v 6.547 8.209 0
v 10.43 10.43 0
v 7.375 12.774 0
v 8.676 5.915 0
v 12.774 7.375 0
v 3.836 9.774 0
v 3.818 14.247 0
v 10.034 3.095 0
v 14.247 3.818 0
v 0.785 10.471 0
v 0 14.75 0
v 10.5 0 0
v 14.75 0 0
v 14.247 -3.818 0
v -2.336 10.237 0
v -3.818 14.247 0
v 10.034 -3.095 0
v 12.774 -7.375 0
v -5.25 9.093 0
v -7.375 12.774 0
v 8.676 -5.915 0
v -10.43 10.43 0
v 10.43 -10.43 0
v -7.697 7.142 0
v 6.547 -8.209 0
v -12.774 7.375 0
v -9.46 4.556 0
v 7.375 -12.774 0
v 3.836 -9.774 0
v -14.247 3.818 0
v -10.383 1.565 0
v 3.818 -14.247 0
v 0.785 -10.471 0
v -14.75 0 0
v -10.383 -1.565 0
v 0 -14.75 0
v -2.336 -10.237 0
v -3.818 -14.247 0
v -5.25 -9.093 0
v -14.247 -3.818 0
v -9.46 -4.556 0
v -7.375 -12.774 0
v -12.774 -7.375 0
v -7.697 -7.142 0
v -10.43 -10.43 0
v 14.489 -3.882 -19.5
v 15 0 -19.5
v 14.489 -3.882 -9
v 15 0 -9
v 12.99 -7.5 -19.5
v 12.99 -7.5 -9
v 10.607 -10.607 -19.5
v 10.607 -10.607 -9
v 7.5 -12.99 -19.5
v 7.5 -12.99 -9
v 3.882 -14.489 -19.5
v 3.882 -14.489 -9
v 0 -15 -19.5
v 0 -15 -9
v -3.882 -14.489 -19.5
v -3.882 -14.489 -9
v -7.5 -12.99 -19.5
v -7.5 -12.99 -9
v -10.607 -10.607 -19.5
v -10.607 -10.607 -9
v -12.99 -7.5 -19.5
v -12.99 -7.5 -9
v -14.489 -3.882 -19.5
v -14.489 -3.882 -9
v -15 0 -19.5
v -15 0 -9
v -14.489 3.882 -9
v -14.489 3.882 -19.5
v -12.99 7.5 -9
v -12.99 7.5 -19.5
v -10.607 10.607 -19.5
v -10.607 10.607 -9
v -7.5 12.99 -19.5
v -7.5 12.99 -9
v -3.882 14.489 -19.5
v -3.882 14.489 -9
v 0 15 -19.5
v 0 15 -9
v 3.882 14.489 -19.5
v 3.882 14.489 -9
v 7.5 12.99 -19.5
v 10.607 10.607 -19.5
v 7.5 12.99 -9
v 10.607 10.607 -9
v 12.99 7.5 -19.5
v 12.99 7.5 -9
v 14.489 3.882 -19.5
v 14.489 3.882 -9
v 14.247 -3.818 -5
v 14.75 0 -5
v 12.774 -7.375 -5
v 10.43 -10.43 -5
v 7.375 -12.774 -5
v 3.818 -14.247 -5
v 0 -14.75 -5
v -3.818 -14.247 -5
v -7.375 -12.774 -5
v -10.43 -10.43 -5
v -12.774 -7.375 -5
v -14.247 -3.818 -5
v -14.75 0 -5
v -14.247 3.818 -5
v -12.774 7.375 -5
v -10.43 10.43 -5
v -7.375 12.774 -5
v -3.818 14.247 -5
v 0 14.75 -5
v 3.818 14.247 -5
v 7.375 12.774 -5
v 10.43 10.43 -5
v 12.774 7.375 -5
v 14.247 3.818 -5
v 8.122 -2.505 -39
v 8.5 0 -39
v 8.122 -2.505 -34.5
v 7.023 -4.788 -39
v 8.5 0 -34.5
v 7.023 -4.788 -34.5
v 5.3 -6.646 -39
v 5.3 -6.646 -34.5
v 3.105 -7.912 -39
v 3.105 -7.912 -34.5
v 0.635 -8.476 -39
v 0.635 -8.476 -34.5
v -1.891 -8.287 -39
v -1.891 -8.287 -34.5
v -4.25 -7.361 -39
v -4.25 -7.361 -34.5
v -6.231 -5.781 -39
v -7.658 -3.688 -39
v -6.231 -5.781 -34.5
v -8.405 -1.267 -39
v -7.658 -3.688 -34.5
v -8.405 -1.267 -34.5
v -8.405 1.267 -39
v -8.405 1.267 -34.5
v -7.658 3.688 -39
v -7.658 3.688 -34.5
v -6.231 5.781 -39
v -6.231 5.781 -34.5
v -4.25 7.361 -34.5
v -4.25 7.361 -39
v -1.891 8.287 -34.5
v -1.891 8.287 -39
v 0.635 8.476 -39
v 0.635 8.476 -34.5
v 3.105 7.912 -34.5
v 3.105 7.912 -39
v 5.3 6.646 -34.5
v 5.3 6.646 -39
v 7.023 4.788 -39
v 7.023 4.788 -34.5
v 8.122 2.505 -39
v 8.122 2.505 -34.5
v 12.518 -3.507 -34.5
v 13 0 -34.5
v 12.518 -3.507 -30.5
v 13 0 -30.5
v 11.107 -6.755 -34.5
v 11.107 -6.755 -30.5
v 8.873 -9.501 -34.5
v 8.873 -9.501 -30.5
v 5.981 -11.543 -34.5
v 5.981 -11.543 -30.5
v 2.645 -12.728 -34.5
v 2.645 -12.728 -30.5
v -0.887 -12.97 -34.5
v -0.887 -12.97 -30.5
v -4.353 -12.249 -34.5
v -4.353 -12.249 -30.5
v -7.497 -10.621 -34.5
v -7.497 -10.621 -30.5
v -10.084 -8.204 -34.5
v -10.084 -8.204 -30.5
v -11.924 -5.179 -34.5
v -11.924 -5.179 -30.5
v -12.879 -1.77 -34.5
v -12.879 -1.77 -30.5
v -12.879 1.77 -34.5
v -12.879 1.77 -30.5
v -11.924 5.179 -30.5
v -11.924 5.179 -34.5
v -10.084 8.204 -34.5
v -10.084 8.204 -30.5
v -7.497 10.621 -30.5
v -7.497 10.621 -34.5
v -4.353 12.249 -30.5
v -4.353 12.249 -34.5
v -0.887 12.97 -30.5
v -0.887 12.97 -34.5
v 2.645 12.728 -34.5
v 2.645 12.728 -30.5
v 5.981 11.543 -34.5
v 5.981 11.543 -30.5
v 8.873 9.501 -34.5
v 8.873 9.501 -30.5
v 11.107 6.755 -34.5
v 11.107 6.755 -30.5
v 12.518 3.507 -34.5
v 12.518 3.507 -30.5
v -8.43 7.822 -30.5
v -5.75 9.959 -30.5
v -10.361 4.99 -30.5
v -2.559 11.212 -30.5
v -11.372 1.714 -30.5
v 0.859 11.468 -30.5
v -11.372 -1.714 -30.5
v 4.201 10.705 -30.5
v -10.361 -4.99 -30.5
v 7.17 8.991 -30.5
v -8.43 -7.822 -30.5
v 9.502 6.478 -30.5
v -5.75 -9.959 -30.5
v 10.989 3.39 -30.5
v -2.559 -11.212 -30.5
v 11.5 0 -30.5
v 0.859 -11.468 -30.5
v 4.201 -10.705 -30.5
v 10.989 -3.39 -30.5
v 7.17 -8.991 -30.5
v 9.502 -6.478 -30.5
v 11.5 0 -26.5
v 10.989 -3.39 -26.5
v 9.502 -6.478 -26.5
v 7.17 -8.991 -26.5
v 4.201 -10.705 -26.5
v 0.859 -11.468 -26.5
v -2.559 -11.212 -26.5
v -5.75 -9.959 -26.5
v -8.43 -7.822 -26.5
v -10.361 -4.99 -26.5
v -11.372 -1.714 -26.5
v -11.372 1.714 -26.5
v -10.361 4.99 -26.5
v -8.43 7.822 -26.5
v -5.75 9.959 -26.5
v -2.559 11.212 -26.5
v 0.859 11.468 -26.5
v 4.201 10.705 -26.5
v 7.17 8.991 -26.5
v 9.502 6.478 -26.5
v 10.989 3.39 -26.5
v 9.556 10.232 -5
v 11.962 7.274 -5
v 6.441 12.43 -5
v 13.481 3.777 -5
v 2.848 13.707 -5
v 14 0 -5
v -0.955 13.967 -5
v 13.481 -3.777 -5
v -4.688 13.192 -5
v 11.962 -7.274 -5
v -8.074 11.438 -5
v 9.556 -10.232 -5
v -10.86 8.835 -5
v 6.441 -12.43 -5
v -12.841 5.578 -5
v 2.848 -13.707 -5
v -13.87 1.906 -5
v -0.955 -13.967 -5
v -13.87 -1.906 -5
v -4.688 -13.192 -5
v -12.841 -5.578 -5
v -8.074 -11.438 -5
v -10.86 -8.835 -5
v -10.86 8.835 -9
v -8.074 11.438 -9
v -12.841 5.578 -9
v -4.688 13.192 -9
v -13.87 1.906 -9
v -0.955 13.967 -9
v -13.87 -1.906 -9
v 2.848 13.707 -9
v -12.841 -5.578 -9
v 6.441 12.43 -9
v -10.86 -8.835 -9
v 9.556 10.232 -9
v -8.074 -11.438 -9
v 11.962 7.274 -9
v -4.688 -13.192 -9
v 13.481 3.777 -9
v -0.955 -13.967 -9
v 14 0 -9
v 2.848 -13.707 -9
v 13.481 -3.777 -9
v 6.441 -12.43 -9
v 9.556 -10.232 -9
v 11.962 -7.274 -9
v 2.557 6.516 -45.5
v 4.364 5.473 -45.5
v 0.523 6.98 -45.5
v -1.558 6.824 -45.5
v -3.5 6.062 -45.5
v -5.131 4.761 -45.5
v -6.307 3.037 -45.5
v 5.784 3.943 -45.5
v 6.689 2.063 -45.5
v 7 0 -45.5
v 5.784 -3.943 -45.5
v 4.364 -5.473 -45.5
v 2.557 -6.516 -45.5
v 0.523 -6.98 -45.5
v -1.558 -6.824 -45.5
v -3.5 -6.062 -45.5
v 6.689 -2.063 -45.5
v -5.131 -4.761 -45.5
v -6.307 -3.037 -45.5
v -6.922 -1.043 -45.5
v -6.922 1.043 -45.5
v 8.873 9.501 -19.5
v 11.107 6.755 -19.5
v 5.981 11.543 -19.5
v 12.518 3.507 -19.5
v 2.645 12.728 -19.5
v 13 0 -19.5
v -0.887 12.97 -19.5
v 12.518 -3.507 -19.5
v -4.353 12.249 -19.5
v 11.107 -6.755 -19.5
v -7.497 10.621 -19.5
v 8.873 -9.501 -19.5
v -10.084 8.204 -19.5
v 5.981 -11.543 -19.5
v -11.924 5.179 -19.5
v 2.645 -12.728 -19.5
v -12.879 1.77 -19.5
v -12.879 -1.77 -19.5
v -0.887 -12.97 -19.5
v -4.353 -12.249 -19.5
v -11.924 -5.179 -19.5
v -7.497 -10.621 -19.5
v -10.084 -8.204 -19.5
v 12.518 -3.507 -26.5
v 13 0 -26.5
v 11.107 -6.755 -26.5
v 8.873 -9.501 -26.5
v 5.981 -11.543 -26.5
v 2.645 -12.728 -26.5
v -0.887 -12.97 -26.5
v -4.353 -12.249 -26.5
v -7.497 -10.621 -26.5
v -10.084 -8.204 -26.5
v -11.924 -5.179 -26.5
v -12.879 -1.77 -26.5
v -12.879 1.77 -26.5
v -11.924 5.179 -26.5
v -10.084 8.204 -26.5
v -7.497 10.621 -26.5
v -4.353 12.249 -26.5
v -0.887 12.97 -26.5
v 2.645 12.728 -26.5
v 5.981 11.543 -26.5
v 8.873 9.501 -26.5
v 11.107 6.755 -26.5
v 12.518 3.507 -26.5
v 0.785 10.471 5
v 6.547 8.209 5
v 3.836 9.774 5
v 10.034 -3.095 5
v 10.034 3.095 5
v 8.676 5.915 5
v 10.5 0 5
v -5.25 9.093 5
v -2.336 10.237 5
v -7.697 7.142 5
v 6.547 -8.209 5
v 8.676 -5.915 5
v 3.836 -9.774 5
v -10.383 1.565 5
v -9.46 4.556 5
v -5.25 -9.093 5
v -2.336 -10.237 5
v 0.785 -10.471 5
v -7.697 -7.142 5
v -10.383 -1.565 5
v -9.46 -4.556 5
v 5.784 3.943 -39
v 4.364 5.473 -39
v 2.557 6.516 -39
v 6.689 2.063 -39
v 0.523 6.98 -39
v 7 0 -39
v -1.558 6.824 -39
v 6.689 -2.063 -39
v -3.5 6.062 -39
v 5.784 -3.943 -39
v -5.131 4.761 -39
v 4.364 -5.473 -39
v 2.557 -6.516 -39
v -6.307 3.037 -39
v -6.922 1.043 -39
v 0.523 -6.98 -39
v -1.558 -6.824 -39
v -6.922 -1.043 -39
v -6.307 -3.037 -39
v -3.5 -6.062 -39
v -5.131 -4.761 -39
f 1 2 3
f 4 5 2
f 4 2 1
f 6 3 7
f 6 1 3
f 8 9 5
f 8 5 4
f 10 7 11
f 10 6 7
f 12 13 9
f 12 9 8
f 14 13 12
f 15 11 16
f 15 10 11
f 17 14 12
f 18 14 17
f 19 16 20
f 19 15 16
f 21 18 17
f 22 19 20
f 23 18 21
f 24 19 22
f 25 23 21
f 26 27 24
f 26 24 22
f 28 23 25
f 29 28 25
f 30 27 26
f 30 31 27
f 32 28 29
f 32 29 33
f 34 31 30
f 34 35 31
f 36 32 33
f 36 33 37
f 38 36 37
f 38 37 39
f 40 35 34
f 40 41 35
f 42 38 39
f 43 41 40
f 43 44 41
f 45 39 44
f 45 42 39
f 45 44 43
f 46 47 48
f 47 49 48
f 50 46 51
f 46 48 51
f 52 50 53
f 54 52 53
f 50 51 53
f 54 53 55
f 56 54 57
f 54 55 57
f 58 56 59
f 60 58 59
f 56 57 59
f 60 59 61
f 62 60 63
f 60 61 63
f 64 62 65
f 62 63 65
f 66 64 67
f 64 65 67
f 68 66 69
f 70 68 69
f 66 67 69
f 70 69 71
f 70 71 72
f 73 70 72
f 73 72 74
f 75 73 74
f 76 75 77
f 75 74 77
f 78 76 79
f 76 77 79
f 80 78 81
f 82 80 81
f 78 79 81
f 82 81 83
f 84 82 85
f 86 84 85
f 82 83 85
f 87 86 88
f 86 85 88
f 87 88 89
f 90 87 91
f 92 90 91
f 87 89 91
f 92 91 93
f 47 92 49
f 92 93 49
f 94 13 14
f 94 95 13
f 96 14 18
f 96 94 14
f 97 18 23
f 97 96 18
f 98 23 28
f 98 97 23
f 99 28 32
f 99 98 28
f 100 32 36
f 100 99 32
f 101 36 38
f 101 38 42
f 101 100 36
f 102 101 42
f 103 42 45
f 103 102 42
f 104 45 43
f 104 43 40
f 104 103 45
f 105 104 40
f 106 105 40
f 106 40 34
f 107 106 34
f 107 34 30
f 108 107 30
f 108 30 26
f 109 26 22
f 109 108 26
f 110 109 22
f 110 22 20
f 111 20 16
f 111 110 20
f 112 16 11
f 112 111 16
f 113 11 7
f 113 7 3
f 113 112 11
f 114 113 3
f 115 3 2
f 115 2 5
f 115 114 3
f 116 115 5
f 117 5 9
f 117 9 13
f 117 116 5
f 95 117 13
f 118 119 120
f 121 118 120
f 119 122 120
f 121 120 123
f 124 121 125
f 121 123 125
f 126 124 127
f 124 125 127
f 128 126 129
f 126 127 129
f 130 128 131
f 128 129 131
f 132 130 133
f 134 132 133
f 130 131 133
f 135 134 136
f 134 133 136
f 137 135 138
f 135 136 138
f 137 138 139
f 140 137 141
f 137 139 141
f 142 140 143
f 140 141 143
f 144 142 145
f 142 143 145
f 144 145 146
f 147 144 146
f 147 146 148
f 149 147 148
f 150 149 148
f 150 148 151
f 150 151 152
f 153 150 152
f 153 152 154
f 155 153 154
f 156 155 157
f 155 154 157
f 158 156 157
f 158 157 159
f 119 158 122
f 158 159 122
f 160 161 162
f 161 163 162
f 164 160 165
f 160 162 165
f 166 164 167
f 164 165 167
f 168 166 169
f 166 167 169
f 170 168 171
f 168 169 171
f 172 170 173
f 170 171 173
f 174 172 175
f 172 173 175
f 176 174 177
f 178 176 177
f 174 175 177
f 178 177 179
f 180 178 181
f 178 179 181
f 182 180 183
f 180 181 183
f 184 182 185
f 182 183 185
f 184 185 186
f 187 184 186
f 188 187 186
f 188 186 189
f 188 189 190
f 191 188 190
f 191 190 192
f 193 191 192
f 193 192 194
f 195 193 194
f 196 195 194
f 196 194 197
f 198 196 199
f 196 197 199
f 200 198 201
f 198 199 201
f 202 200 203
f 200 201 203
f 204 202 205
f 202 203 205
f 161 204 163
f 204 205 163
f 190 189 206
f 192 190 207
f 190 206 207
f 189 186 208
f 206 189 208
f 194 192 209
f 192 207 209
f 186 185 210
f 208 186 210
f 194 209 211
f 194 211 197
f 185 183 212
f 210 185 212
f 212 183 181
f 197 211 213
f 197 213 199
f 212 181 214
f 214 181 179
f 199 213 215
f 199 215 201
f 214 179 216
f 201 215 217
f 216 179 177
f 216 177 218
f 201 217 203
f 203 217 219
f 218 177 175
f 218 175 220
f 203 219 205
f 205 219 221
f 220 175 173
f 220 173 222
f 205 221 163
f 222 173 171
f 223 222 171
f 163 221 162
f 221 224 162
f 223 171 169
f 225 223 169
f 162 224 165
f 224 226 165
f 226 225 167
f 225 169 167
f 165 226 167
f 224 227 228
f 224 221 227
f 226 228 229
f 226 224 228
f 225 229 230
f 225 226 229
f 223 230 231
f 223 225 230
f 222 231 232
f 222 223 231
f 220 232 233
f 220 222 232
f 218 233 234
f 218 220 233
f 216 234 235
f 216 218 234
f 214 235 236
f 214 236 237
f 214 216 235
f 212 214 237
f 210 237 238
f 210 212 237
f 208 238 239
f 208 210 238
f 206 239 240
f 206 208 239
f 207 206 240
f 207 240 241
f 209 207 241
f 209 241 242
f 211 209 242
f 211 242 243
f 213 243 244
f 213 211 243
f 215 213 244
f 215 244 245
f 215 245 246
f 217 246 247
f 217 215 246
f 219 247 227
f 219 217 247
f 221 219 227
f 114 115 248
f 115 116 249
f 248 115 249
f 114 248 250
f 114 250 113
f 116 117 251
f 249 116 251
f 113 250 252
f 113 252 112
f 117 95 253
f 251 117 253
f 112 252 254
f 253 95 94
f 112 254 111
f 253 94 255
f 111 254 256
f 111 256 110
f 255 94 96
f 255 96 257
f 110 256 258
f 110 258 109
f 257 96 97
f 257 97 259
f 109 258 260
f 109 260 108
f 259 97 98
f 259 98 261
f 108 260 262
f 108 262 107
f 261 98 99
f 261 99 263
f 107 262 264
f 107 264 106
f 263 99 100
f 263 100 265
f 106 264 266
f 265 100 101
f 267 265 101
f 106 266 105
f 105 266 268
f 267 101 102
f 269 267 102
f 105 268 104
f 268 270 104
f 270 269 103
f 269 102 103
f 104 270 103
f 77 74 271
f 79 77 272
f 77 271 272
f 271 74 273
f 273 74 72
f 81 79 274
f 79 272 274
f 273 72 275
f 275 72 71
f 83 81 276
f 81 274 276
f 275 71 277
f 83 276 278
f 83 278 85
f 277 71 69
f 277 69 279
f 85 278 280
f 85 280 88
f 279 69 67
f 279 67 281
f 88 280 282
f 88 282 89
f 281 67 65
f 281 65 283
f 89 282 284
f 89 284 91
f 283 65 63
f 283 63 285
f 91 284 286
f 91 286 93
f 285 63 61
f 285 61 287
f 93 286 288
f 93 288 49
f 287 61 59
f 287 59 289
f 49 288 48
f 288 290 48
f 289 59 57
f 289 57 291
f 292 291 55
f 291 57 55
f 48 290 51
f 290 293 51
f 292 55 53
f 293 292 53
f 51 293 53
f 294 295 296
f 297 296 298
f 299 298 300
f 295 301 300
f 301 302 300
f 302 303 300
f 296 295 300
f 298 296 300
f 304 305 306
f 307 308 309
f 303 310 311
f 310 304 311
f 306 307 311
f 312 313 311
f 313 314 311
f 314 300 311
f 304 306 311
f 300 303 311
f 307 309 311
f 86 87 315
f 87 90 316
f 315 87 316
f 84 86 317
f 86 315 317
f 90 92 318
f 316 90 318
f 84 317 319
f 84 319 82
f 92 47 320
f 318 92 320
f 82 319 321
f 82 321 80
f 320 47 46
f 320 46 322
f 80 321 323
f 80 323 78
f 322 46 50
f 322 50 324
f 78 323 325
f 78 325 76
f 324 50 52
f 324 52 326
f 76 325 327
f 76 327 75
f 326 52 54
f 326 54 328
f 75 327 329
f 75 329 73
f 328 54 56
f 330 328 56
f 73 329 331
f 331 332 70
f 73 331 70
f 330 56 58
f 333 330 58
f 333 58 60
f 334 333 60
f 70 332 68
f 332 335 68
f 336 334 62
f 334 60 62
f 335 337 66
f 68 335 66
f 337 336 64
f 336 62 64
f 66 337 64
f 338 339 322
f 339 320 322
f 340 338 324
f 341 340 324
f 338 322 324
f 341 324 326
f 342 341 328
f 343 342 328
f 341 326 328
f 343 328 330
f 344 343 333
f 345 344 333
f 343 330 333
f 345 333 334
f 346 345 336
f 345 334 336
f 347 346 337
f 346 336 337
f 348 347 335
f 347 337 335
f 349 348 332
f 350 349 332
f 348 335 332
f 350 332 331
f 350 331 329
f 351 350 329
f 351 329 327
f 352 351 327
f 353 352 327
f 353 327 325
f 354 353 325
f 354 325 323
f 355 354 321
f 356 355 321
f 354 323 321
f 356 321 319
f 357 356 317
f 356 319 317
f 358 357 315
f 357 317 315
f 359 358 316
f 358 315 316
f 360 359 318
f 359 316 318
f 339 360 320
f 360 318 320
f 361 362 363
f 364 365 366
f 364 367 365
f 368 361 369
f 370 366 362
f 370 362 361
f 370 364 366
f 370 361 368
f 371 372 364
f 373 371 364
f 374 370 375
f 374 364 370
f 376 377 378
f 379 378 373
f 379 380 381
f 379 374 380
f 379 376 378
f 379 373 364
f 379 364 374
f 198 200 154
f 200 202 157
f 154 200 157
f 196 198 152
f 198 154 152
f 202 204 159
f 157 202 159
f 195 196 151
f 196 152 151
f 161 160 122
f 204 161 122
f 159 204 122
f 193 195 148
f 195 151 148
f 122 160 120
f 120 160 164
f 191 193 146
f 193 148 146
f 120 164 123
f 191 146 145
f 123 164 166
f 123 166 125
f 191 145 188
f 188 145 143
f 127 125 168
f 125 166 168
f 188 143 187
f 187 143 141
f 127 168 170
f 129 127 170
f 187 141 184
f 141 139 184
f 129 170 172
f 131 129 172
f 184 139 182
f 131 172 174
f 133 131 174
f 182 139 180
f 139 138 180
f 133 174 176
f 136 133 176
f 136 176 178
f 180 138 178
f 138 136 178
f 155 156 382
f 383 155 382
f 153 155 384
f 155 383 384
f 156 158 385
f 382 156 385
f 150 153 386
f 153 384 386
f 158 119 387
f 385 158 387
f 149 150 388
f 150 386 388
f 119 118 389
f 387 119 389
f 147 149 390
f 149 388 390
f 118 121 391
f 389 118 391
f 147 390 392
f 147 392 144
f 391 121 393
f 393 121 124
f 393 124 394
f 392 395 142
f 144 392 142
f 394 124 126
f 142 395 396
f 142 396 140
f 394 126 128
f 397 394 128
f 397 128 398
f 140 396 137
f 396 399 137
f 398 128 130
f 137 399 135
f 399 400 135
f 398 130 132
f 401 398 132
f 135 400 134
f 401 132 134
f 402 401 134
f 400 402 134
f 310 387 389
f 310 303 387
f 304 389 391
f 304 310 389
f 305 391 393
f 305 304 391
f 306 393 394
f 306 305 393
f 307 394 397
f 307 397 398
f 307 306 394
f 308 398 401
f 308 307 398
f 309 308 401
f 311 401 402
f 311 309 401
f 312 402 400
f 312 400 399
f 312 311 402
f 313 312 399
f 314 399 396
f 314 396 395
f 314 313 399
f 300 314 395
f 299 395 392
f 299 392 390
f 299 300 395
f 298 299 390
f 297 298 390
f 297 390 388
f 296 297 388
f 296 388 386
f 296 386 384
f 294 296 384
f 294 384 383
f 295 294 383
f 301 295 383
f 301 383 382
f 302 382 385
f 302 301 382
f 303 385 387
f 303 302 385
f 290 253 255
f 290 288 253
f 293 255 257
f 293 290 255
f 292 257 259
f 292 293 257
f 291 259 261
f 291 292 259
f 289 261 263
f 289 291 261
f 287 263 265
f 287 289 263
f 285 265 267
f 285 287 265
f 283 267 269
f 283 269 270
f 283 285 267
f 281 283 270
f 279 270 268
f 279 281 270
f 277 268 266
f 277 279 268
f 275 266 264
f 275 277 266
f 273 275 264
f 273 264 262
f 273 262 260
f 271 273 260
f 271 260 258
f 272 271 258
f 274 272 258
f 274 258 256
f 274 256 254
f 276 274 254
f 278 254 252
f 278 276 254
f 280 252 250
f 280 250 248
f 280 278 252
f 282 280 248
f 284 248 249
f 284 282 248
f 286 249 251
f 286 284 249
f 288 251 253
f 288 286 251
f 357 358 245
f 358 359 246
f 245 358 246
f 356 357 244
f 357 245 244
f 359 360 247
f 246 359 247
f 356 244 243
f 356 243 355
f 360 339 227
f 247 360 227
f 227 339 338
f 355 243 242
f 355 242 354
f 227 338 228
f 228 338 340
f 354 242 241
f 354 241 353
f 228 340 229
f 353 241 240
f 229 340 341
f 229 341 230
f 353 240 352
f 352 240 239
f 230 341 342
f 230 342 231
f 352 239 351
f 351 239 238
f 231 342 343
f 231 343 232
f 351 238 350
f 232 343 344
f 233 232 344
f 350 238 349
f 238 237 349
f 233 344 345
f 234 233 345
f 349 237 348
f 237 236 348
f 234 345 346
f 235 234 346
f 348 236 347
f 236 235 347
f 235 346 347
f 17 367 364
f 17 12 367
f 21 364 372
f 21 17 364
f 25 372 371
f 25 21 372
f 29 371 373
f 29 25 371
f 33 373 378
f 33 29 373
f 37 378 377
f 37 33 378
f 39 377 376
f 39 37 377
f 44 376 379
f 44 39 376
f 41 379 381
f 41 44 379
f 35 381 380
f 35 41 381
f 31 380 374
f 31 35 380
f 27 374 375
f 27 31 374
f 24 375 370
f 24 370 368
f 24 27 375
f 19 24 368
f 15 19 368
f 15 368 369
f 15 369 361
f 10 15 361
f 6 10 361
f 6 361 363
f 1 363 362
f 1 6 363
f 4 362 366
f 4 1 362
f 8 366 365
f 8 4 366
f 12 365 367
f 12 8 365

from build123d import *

# Parameters (mm, degrees)
SKETCH1_W   = 5
SKETCH1_H   = 10.5
SKETCH1_H_2 = 14.75
SKETCH1_W_2 = 4
SKETCH1_H_3 = 14
SKETCH1_H_4 = 11.5
SKETCH1_W_3 = 6.5
SKETCH1_H_5 = 7


with BuildPart() as part:
    # Sketch1 → Revolve1 (revolve)
    with BuildSketch(Plane(origin=(0, 0, 0), x_dir=(0, 0, -1), z_dir=(1, 0, 0)), mode=Mode.PRIVATE) as revolve1_sk:
        with Locations((-2.5, 5.25)):
            Rectangle(SKETCH1_W, SKETCH1_H)
        with Locations((2.5, 7.375)):
            Rectangle(SKETCH1_W, SKETCH1_H_2)
        with Locations((7, 7)):
            Rectangle(SKETCH1_W_2, SKETCH1_H_3)
        Polygon((9, 14), (9, 0), (19.5, 0), (19.5, 13), (19.5, 15), (9, 15), align=None)
        Polygon((19.5, 13), (19.5, 0), (26.5, 0), (26.5, 11.5), (26.5, 13), align=None)
        with Locations((28.5, 5.75)):
            Rectangle(SKETCH1_W_2, SKETCH1_H_4)
        Polygon((30.5, 11.5), (30.5, 0), (34.5, 0), (34.5, 8.5), (34.5, 13), (30.5, 13), align=None)
        Polygon((34.5, 8.5), (34.5, 0), (39, 0), (39, 7), (39, 8.5), align=None)
        with Locations((42.25, 3.5)):
            Rectangle(SKETCH1_W_3, SKETCH1_H_5)
    revolve(revolve1_sk.sketch.rotate(Axis((0, 0, -9), (0, 0, -1)), 90), axis=Axis((0, 0, -9), (0, 0, -1)))


solid = part.part
